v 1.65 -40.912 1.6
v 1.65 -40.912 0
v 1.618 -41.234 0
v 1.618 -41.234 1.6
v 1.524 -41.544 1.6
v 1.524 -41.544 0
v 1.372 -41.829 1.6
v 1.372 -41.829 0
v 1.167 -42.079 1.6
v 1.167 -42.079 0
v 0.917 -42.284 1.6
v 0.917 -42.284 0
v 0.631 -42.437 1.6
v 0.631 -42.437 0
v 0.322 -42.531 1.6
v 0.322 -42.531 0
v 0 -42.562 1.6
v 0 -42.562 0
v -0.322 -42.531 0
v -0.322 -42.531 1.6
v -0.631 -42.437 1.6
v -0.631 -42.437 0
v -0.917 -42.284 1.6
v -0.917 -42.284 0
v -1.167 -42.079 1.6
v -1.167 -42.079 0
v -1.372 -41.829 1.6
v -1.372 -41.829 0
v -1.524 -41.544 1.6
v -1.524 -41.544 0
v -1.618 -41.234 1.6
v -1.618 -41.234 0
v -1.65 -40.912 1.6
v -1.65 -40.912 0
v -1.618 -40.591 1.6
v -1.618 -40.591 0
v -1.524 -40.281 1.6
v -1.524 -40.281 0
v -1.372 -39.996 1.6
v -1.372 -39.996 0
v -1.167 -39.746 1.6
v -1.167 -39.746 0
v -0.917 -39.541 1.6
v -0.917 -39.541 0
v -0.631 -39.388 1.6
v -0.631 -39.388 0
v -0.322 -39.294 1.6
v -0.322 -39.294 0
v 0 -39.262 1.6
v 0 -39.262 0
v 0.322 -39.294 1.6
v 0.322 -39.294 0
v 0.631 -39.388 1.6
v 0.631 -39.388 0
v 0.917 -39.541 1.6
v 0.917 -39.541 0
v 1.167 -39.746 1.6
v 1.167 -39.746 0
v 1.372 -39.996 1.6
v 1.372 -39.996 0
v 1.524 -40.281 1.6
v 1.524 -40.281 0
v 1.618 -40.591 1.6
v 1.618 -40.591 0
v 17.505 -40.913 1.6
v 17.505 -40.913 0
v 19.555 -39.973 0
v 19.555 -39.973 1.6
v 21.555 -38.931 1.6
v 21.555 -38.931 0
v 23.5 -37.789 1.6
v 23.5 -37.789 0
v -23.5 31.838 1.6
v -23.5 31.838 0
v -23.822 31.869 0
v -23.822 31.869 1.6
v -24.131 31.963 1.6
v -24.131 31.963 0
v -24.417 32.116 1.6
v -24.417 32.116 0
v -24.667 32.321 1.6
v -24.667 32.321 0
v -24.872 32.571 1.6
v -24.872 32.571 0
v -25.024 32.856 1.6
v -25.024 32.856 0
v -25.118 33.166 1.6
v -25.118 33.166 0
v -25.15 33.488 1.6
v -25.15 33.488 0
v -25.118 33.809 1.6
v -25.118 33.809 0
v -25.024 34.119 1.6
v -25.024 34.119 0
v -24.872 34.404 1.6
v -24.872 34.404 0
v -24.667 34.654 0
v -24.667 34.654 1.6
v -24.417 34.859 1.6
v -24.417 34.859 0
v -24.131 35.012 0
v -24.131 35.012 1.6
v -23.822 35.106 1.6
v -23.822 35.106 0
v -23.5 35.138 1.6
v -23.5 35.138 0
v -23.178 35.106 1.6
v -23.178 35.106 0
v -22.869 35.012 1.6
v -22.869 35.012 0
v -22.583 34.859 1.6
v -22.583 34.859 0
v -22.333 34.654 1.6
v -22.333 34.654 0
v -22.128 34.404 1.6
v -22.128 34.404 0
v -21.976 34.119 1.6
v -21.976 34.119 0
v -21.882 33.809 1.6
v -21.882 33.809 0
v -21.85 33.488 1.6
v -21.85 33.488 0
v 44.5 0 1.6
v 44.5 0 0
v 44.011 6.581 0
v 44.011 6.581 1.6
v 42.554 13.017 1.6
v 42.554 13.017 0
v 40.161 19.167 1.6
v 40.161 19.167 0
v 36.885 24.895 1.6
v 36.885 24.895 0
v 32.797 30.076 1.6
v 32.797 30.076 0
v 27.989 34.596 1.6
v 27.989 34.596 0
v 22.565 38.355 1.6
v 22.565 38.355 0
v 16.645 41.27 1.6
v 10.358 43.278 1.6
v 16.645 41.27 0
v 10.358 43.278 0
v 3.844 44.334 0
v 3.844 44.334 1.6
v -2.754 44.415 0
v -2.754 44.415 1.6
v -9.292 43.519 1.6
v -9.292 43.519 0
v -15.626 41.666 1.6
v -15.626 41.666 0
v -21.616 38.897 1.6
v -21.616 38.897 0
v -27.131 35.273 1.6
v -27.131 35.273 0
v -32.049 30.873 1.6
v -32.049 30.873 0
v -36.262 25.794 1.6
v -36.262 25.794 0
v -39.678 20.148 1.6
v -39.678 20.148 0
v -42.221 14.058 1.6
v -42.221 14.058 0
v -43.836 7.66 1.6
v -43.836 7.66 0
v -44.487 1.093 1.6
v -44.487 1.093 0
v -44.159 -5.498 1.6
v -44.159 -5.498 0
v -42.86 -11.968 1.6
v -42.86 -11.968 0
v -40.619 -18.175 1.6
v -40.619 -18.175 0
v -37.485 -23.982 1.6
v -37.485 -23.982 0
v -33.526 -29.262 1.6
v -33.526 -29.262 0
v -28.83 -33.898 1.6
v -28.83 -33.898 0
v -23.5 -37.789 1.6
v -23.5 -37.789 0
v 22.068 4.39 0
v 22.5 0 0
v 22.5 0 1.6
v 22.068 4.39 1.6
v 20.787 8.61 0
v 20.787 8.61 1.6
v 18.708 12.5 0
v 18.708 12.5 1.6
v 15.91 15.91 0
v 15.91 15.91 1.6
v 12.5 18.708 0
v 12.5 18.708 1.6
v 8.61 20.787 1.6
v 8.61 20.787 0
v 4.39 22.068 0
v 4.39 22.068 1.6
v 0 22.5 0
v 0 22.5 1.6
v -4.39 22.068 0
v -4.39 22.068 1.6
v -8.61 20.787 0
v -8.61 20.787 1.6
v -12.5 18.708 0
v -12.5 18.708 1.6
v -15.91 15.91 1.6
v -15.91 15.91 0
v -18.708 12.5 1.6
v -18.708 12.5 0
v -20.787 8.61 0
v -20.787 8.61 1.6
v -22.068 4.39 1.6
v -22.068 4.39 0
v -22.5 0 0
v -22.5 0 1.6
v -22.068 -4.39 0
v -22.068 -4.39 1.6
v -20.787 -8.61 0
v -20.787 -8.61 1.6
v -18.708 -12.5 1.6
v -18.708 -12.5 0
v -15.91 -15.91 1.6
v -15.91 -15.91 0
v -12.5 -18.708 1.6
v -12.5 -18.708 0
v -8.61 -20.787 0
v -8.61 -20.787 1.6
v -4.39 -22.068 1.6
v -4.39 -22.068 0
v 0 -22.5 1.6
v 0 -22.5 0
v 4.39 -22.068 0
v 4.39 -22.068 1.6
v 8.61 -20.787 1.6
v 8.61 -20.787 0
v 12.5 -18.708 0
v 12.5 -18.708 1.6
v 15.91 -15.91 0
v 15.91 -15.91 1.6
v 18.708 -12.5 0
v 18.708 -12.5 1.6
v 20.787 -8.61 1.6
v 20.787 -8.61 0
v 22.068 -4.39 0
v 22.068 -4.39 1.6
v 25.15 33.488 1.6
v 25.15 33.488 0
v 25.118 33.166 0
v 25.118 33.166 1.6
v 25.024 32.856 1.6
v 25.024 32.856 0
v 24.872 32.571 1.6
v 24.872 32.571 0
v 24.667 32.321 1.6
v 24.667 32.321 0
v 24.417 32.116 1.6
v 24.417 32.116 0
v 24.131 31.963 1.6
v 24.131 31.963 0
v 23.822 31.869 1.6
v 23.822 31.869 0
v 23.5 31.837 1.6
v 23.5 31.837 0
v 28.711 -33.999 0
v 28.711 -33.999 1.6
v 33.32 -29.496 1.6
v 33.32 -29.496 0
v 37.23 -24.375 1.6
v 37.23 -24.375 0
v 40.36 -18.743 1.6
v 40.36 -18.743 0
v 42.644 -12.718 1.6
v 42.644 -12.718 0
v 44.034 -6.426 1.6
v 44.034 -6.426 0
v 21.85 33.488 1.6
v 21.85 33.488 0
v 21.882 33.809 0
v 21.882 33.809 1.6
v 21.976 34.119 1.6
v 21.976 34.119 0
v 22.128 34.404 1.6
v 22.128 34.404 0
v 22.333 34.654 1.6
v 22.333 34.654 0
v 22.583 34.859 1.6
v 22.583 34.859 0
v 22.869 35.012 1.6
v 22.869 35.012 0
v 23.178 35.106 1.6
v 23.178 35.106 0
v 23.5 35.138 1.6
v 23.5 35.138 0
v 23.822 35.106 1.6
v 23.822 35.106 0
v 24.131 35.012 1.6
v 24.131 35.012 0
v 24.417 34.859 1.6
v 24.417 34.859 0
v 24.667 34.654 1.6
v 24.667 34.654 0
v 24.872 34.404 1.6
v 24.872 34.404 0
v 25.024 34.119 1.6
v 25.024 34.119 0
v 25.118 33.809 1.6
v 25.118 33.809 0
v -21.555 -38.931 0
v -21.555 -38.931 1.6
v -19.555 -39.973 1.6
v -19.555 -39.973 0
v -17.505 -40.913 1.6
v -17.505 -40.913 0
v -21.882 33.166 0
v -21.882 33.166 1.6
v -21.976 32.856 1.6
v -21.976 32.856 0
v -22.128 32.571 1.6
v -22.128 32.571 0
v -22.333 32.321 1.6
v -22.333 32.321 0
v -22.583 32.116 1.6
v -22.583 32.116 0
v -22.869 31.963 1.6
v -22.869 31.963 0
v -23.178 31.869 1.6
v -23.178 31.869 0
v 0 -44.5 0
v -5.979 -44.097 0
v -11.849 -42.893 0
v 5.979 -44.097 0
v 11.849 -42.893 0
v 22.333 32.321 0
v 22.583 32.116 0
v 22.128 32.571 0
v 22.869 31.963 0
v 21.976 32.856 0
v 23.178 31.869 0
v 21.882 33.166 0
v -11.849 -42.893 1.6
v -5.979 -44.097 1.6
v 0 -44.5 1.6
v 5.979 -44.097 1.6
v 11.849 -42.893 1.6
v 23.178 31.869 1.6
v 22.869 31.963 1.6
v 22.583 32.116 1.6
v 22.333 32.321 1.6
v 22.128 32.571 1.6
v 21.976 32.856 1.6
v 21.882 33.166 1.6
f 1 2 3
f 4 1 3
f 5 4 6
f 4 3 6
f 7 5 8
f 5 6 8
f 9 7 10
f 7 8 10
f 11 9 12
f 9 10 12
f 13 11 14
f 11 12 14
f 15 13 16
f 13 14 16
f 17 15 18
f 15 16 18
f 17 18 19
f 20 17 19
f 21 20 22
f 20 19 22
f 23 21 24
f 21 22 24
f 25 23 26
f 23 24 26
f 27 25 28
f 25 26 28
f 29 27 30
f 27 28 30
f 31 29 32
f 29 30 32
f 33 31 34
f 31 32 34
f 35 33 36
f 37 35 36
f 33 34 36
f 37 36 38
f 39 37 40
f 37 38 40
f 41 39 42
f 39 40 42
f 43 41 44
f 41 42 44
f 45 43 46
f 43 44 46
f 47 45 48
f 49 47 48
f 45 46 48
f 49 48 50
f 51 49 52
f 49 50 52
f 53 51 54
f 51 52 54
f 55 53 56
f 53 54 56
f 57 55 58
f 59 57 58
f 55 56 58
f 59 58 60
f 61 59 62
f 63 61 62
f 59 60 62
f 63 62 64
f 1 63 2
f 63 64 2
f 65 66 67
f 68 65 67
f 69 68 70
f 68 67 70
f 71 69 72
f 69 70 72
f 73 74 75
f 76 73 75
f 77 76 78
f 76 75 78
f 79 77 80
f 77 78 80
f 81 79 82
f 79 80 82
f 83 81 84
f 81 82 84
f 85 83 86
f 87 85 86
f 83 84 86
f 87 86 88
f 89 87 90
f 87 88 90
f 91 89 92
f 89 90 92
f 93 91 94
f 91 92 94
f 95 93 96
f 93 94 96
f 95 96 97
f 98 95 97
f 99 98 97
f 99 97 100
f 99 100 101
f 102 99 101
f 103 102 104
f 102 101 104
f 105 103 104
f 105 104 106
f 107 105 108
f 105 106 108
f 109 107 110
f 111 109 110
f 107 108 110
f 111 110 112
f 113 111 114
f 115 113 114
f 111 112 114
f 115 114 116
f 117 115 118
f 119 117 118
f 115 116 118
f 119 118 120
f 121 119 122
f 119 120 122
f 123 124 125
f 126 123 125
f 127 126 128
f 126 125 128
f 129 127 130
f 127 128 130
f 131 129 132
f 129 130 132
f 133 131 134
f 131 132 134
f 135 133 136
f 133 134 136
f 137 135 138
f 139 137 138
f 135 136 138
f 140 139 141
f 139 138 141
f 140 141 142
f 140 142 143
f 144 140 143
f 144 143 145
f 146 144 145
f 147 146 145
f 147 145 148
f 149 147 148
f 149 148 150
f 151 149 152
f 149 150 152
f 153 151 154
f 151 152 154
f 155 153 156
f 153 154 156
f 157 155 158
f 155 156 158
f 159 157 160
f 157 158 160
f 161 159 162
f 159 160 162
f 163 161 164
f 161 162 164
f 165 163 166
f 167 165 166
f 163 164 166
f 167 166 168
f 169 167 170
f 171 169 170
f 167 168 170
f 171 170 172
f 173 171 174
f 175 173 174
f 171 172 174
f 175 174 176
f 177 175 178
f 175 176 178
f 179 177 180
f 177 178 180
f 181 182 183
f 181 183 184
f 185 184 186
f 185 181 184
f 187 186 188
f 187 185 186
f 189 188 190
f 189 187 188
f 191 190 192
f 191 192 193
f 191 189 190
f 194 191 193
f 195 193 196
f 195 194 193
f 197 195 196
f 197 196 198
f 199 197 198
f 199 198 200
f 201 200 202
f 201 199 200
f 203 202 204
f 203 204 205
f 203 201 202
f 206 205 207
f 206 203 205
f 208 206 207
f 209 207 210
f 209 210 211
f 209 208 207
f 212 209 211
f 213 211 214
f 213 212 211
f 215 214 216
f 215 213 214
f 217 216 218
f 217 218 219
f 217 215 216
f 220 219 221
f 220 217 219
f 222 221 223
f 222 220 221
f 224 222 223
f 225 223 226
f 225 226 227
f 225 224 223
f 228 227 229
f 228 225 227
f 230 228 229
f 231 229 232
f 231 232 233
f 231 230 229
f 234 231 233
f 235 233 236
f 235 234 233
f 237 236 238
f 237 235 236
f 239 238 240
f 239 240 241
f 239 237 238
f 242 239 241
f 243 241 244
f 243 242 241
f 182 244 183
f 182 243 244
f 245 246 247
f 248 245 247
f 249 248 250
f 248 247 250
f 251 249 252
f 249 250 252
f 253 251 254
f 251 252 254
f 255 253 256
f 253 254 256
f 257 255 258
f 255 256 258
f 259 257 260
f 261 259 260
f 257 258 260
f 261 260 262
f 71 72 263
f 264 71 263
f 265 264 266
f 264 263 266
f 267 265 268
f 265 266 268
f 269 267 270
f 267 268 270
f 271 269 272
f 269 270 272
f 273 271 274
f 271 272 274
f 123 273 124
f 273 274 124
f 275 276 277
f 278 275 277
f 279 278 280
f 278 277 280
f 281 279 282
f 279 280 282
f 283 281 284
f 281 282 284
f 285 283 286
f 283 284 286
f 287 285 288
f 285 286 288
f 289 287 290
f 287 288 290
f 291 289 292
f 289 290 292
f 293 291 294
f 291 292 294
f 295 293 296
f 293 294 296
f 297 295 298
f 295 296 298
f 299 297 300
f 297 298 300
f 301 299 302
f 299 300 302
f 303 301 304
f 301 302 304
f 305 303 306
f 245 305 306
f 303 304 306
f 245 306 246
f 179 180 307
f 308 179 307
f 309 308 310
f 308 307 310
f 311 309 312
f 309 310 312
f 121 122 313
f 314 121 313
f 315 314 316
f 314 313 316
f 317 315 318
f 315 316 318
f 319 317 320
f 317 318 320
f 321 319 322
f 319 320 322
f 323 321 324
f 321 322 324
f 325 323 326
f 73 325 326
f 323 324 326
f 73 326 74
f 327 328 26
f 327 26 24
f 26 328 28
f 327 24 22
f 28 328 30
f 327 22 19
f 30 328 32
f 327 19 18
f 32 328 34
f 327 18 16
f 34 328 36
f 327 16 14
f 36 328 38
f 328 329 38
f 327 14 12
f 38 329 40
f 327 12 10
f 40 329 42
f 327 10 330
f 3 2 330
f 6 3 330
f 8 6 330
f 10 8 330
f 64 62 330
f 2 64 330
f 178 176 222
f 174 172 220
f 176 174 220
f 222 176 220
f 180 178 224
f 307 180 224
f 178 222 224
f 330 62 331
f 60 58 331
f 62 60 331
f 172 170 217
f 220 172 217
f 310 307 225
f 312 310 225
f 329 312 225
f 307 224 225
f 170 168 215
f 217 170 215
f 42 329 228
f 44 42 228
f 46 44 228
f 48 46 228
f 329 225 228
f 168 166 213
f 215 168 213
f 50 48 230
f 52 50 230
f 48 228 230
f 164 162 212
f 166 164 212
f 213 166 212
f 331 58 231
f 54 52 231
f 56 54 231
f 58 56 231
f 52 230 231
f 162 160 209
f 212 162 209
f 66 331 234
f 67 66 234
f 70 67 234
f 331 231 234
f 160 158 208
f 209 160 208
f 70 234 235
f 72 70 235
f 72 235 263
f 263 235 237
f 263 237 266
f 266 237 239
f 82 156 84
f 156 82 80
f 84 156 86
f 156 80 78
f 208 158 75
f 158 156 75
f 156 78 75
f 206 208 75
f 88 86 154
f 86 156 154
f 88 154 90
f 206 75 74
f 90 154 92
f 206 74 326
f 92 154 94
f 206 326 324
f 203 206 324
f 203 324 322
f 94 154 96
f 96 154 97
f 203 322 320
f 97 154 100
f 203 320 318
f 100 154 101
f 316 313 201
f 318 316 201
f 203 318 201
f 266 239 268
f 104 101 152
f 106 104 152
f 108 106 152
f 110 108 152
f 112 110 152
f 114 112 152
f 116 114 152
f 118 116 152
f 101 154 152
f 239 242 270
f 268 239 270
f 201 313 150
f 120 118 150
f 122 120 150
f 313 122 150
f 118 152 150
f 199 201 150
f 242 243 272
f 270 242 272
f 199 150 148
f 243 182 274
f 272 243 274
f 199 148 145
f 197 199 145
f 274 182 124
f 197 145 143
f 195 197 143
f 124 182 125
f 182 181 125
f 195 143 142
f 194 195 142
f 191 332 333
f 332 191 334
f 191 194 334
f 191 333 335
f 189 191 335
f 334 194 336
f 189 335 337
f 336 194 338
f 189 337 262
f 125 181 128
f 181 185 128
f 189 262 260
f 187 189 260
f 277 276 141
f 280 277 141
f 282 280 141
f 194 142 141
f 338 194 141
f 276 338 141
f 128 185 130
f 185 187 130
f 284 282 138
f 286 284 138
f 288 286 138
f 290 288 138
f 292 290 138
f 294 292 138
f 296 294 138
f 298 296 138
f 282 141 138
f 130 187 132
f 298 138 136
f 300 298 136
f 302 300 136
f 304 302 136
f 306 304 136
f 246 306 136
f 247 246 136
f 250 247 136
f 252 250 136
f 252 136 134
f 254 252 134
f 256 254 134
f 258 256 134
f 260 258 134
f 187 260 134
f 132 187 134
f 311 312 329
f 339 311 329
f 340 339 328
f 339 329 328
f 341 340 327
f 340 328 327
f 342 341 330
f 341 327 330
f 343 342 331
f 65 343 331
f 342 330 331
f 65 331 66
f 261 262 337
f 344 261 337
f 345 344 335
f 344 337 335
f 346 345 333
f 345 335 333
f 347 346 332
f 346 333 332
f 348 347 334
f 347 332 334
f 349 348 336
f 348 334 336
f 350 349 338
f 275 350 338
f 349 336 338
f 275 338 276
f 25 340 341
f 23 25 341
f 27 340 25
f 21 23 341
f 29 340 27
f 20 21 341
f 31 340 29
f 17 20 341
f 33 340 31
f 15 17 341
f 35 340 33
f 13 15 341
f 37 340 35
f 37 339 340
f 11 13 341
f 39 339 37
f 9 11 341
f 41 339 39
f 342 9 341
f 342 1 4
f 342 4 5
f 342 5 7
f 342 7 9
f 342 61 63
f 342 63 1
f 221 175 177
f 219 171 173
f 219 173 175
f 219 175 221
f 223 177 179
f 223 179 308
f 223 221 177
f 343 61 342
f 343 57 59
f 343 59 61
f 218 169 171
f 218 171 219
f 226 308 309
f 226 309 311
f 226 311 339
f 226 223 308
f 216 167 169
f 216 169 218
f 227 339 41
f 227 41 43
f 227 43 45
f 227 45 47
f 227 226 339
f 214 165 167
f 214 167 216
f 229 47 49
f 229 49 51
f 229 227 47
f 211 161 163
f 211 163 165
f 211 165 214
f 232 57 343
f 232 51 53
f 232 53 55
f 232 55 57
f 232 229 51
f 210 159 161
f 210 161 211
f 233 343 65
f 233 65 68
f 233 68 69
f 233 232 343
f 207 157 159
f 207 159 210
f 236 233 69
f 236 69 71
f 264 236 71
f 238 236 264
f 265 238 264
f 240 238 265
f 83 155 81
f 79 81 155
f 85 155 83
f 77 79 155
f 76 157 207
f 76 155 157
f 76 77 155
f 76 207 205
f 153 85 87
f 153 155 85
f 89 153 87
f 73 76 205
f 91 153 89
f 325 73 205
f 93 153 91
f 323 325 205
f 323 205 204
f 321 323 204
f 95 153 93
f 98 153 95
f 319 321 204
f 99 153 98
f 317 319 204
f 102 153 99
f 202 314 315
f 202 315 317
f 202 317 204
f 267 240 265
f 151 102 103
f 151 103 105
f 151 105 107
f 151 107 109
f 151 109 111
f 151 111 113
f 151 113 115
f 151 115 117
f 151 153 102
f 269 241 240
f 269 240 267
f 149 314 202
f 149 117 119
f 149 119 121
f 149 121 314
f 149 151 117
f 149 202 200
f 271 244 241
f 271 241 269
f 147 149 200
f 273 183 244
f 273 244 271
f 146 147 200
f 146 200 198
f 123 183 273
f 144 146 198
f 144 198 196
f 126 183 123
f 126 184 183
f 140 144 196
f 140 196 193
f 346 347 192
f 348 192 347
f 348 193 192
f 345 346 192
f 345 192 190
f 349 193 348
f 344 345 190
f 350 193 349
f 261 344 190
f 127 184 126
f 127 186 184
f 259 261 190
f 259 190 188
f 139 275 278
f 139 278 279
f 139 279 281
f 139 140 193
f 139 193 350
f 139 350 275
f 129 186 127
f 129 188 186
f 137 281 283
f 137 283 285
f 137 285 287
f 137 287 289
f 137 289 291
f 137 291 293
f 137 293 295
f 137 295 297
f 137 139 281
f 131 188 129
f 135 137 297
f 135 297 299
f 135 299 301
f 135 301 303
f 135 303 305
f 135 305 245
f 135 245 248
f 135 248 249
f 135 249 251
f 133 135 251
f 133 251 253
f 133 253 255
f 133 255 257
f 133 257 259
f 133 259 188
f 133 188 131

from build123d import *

# Parameters (mm, degrees)
F0_R     = 22.5
F1_DEPTH = 1.6


with BuildPart() as f1:
    # F0 (on Top) → F1 (new body)
    with BuildSketch(Plane.XY):
        with BuildLine():
            ThreePointArc((23.5, -37.7888872554), (38.8973006776, -21.6159663212), (44.5, 0))
            ThreePointArc((44.5, 0), (-21.6159663212, 38.8973006776), (-23.5, -37.7888872554))
            Line((-23.5, -37.7888872554), (-23.5, 31.8375))
            ThreePointArc((-23.5, 31.8375), (-24.666726189, 34.654226189), (-21.85, 33.4875))
            Line((-21.85, 33.4875), (21.85, 33.4875))
            ThreePointArc((21.85, 33.4875), (23.5, 35.1375), (25.15, 33.4875))
            ThreePointArc((25.15, 33.4875), (24.666726189, 32.320773811), (23.5, 31.8375))
            Line((23.5, 31.8375), (23.5, -37.7888872554))
        make_face()
        with BuildLine():
            Line((-23.5, 31.8375), (-23.5, -37.7888872554))
            ThreePointArc((-23.5, -37.7888872554), (-20.5617909506, -39.4647026202), (-17.504780597, -40.9125))
            Line((-17.504780597, -40.9125), (-1.65, -40.9125))
            ThreePointArc((-1.65, -40.9125), (0, -39.2625), (1.65, -40.9125))
            Line((1.65, -40.9125), (17.504780597, -40.9125))
            ThreePointArc((17.504780597, -40.9125), (20.5617909506, -39.4647026202), (23.5, -37.7888872554))
            Line((23.5, -37.7888872554), (23.5, 31.8375))
            ThreePointArc((23.5, 31.8375), (22.333273811, 32.320773811), (21.85, 33.4875))
            Line((21.85, 33.4875), (-21.85, 33.4875))
            ThreePointArc((-21.85, 33.4875), (-22.333273811, 32.320773811), (-23.5, 31.8375))
        make_face()
        Circle(F0_R, mode=Mode.SUBTRACT)
        with BuildLine():
            Line((-1.65, -40.9125), (-17.504780597, -40.9125))
            ThreePointArc((-17.504780597, -40.9125), (0, -44.5), (17.504780597, -40.9125))
            Line((17.504780597, -40.9125), (1.65, -40.9125))
            ThreePointArc((1.65, -40.9125), (0, -42.5625), (-1.65, -40.9125))
        make_face()
    extrude(amount=F1_DEPTH)


solid = f1.part
